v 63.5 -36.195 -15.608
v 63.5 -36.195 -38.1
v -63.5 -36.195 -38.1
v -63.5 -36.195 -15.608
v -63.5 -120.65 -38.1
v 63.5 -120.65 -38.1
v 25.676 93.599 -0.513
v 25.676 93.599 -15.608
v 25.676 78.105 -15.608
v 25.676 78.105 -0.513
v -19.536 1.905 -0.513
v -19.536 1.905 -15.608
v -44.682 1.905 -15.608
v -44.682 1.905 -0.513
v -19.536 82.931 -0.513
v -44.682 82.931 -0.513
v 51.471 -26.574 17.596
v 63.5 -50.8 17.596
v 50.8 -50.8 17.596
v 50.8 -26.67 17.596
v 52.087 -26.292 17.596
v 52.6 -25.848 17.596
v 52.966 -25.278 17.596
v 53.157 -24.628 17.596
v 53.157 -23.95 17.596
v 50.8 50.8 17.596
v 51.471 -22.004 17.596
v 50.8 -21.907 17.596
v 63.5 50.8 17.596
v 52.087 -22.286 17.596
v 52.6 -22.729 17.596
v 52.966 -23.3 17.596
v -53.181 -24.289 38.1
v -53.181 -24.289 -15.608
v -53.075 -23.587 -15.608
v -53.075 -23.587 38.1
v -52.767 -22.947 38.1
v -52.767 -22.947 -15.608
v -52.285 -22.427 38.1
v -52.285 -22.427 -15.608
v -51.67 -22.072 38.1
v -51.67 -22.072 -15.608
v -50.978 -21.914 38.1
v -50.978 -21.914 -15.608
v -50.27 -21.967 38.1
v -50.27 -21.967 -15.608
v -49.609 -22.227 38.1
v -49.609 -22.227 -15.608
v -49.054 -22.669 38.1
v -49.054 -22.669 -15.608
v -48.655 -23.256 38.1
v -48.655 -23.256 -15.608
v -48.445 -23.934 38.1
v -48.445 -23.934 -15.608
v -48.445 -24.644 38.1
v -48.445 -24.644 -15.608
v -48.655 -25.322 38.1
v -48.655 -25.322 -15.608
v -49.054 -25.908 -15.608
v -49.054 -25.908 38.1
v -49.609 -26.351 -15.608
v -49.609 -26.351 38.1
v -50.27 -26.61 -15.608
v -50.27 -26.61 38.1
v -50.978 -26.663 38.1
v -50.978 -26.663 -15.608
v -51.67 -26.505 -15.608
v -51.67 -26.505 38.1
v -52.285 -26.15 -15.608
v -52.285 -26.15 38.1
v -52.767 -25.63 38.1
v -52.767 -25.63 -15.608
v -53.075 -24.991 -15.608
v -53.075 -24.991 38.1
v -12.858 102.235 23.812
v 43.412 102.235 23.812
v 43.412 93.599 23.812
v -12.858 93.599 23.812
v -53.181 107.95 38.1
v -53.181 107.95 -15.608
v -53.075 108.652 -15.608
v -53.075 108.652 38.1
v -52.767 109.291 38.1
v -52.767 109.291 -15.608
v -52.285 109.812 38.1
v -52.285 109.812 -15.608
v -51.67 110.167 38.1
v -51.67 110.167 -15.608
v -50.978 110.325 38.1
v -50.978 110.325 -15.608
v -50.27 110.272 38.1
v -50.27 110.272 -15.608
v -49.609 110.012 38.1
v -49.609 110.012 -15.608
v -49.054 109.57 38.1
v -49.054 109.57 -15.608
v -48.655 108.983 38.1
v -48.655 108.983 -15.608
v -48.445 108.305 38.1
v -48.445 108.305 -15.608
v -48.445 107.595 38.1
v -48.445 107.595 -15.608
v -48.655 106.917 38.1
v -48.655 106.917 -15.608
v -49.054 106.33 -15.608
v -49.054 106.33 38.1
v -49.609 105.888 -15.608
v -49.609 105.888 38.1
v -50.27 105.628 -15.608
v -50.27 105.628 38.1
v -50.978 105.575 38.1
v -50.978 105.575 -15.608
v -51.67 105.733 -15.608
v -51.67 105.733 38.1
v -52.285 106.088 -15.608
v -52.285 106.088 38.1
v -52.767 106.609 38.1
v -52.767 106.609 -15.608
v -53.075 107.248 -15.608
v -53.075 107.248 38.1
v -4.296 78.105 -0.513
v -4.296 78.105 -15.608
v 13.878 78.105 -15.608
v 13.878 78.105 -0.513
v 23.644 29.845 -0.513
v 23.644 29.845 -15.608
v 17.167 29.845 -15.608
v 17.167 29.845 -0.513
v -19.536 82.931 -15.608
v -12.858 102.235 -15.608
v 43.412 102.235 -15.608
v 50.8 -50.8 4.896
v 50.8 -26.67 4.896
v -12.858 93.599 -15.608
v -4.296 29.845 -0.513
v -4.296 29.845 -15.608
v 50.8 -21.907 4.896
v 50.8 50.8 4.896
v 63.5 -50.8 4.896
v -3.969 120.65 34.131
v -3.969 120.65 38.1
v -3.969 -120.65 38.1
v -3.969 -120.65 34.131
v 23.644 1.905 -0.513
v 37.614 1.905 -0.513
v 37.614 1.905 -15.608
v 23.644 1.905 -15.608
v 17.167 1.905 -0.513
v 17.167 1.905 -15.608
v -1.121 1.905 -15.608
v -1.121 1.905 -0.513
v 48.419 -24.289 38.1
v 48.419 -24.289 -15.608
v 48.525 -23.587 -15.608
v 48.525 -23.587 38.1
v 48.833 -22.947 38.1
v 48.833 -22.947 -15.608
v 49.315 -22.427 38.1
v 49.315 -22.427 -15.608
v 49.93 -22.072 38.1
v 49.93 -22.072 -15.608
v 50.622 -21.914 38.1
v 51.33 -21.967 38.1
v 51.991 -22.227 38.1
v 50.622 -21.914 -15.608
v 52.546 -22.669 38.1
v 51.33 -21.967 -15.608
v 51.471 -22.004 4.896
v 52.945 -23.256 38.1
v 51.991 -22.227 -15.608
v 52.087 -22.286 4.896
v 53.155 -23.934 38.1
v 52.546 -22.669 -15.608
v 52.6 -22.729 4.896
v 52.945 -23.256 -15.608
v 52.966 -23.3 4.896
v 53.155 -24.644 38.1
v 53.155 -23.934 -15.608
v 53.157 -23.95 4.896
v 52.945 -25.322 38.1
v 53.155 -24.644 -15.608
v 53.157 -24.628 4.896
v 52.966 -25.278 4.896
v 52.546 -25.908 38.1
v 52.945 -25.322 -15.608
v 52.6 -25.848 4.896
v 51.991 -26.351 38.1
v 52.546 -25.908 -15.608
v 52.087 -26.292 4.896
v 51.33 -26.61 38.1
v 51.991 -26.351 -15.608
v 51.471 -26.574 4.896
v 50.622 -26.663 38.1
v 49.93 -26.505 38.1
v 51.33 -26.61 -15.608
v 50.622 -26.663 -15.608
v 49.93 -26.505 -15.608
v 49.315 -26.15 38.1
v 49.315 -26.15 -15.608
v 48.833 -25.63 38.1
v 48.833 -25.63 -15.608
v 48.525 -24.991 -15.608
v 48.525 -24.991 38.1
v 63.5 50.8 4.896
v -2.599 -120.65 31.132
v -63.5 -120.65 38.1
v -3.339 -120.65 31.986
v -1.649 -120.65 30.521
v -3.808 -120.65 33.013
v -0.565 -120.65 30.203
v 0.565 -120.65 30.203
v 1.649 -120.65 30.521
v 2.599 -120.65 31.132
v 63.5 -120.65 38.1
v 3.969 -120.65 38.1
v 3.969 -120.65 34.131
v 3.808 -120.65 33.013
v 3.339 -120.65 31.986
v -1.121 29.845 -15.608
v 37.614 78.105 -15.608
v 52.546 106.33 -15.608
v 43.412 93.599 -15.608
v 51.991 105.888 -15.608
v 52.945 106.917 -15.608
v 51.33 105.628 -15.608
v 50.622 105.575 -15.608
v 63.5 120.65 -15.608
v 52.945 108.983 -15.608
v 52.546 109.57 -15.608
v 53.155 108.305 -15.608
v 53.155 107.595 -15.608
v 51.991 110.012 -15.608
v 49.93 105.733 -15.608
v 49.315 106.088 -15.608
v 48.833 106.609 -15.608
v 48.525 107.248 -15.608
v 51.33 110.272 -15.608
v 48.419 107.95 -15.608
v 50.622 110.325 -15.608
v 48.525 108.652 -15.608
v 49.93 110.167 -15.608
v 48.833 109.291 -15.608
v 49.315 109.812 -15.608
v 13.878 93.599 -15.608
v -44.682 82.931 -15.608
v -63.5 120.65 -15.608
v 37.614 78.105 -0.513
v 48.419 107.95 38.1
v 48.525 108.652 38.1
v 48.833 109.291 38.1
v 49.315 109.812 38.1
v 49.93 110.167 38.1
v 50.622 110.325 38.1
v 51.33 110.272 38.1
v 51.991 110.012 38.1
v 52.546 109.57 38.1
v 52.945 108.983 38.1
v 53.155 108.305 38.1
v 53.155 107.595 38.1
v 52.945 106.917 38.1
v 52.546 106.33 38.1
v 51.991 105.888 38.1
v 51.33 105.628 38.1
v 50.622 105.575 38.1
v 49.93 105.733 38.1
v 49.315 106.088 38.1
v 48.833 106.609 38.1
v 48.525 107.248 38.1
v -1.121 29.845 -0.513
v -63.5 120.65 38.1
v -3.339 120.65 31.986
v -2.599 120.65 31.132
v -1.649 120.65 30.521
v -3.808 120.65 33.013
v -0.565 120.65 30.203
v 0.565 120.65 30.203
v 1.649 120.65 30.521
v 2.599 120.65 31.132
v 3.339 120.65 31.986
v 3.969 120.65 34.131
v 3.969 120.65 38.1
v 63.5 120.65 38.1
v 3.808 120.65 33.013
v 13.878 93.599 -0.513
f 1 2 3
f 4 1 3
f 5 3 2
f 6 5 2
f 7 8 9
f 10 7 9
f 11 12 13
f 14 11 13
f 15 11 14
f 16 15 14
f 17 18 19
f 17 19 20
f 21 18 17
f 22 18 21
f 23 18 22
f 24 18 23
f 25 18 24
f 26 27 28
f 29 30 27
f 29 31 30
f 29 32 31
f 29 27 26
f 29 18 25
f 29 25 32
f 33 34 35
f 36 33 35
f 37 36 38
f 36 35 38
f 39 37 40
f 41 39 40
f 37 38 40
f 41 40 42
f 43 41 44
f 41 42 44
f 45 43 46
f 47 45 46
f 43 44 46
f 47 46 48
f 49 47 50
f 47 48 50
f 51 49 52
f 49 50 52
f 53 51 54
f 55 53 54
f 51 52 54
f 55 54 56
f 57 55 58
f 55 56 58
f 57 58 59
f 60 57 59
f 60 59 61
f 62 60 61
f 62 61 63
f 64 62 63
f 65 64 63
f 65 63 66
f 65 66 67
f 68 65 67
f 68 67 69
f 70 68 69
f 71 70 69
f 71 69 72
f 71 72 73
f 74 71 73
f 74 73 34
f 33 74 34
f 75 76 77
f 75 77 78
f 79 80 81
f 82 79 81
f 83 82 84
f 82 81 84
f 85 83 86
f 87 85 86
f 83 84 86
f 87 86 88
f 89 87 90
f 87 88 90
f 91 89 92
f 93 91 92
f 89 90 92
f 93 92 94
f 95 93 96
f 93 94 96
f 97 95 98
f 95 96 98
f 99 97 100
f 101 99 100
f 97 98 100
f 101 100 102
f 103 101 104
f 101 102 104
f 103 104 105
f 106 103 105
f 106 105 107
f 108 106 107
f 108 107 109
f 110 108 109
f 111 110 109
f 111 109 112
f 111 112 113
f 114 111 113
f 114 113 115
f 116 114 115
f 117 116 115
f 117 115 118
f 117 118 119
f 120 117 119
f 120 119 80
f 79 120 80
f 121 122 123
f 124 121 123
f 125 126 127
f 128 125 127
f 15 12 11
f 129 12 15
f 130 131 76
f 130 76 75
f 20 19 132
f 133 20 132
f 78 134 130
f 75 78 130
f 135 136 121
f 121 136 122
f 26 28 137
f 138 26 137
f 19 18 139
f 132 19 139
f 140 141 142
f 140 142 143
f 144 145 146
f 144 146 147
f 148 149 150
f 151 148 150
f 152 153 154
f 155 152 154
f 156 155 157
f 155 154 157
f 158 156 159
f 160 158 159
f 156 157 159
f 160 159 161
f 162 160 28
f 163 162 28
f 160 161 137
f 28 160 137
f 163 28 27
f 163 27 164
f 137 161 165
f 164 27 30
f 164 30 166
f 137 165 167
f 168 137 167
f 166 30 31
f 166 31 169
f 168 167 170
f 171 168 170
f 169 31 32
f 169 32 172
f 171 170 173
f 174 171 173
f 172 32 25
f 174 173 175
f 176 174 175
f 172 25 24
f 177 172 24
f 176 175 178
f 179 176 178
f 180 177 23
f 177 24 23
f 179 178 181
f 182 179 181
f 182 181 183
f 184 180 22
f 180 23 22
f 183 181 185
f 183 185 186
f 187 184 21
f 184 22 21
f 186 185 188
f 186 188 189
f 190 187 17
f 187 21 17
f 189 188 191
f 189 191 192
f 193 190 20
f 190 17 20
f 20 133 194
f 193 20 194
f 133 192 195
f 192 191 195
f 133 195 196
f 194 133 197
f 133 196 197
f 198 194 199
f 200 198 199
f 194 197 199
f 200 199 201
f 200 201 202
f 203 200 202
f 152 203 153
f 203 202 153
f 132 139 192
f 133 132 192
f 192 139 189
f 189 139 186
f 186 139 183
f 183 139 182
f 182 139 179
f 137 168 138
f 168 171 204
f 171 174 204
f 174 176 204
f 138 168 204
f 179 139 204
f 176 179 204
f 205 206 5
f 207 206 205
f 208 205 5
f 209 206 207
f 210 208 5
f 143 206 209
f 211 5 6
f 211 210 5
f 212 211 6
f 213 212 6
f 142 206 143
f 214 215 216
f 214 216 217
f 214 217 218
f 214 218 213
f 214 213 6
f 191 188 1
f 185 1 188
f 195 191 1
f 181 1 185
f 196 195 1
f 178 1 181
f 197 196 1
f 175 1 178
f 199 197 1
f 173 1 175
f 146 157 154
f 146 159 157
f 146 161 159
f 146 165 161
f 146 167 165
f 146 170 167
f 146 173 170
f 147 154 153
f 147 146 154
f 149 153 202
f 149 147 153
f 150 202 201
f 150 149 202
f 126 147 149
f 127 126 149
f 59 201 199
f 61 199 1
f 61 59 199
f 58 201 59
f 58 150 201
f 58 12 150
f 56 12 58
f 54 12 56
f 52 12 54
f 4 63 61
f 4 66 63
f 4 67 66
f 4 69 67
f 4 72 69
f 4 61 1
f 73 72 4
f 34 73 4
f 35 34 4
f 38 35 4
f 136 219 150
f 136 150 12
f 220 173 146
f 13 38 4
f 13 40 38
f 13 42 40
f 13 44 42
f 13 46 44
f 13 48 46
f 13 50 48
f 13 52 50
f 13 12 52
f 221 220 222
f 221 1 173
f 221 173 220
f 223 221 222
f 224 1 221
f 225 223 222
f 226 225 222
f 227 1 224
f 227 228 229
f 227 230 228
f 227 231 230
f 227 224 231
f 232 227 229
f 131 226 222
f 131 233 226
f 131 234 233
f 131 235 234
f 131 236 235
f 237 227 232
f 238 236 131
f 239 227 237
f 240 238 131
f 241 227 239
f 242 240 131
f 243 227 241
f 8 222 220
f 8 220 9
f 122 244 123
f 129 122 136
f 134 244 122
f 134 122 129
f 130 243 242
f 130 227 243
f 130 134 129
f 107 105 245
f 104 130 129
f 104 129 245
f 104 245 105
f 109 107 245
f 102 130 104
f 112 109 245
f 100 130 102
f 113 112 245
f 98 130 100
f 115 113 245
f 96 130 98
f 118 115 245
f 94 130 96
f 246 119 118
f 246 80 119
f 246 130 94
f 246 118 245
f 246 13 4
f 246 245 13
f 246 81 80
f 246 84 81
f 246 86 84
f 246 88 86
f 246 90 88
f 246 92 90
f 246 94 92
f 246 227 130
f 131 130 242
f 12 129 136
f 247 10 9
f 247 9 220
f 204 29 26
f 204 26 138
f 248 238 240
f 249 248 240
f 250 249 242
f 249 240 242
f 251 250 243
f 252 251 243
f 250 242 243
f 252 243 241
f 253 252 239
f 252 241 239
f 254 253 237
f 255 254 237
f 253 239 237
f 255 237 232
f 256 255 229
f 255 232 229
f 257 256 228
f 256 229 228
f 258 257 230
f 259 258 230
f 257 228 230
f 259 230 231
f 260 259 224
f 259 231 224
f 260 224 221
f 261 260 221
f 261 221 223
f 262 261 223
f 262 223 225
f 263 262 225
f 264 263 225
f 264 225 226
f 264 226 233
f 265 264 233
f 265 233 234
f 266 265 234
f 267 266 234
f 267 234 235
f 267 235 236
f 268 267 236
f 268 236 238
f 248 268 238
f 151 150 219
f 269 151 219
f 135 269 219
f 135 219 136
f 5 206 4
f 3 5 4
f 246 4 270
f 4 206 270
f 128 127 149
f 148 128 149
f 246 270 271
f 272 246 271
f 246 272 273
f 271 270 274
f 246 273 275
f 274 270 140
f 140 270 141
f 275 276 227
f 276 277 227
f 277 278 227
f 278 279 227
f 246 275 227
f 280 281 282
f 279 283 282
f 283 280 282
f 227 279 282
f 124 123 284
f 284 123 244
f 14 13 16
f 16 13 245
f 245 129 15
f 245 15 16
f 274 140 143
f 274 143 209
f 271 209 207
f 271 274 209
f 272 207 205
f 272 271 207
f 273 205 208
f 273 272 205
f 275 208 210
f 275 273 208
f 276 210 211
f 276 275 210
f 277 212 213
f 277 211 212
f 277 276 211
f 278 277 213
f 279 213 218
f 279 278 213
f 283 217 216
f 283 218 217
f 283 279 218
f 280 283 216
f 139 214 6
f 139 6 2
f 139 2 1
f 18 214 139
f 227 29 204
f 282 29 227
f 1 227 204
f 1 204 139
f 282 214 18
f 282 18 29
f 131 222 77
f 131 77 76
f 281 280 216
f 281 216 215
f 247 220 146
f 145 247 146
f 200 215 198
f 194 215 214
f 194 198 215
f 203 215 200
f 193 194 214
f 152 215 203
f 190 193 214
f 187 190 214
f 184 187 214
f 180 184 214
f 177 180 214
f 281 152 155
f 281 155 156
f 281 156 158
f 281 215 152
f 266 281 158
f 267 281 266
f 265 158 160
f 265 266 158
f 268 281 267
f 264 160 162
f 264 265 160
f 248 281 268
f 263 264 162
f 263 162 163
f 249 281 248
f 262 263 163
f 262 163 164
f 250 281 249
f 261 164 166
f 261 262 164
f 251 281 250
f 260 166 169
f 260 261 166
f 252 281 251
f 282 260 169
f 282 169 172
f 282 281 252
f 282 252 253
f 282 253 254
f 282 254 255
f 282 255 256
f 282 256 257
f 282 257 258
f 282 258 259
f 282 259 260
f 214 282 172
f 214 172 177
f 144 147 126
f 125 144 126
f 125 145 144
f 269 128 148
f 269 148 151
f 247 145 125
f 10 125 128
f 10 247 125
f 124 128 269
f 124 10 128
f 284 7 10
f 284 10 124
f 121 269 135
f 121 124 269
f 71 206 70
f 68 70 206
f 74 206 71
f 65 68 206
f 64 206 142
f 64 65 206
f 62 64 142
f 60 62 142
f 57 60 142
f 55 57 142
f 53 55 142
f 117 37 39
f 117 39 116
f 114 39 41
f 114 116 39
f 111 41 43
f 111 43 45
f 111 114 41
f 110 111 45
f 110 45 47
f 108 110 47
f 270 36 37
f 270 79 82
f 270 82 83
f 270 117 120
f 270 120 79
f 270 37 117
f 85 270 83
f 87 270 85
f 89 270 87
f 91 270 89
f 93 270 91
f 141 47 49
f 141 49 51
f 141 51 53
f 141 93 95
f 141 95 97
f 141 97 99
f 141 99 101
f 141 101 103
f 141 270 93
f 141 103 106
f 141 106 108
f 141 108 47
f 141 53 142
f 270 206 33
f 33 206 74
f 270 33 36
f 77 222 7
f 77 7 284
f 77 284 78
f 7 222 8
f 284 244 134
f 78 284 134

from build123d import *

# Parameters (mm, degrees)
SKETCH1_W           = 127
SKETCH1_H           = 241.3
BOSS_EXTRUDE1_DEPTH = 38.1
CUT_EXTRUDE1_REACH  = 254.408
SKETCH3_W           = 25.146
SKETCH3_H           = 81.026
CUT_EXTRUDE2_DEPTH  = 37.5875
SKETCH4_W           = 56.27
SKETCH4_H           = 8.636
CUT_EXTRUDE3_DEPTH  = 61.9125
SKETCH5_W           = 127
SKETCH5_H           = 156.845
CUT_EXTRUDE4_DEPTH  = 22.4917
CUT_EXTRUDE5_REACH  = 148.538
SKETCH6_R           = 2.38125
SKETCH7_W           = 12.7
SKETCH7_H           = 101.6
CUT_EXTRUDE6_DEPTH  = 12.7


with BuildPart() as part:
    # Sketch1 → Boss-Extrude1 (new, symmetric)
    with BuildSketch(Plane.XY):
        Rectangle(SKETCH1_W, SKETCH1_H)
    extrude(amount=BOSS_EXTRUDE1_DEPTH, both=True)

    # Sketch2 → Cut-Extrude1 (cut, up to next)
    with BuildSketch(Plane(origin=(0, 120.65, 0), x_dir=(1, 0, 0), z_dir=(0, 1, 0)), mode=Mode.PRIVATE) as cut_extrude1_sk1:
        with BuildLine():
            Line((-3.96875, -38.1), (-3.96875, -34.13125))
            ThreePointArc((-3.96875, -34.13125), (0, -30.1625), (3.96875, -34.13125))
            Line((3.96875, -34.13125), (3.96875, -38.1))
            Line((3.96875, -38.1), (-3.96875, -38.1))
        make_face()
    cut_extrude1_tool1 = extrude(cut_extrude1_sk1.sketch, amount=-CUT_EXTRUDE1_REACH, mode=Mode.PRIVATE) & part.part
    add(cut_extrude1_tool1.solids().sort_by_distance((0, 120.65, 34.501732))[0], mode=Mode.SUBTRACT)

    # Sketch3 → Cut-Extrude2 (cut)
    with BuildSketch(Plane(origin=(0, 0, -38.1), x_dir=(-1, 0, 0), z_dir=(0, 0, -1))):
        Polygon((-37.614075, 78.105), (-37.614075, 57.8612), (-37.614075, 39.878), (-37.614075, 31.75), (-37.614075, 1.905), (-23.644075, 1.905), (-23.644075, 29.845), (-17.167075, 29.845), (-17.167075, 1.905), (1.120925, 1.905), (1.120925, 29.845), (4.295925, 29.845), (4.295925, 78.105), (-13.877775, 78.105), (-13.877775, 96.139), (-25.676075, 96.139), (-25.676075, 78.105), align=None)
        with Locations((32.108925, 42.418)):
            Rectangle(SKETCH3_W, SKETCH3_H)
    extrude(amount=-CUT_EXTRUDE2_DEPTH, mode=Mode.SUBTRACT)

    # Sketch4 → Cut-Extrude3 (cut)
    with BuildSketch(Plane(origin=(0, 0, -38.1), x_dir=(-1, 0, 0), z_dir=(0, 0, -1))):
        with Locations((-15.276925, 97.917)):
            Rectangle(SKETCH4_W, SKETCH4_H)
    extrude(amount=-CUT_EXTRUDE3_DEPTH, mode=Mode.SUBTRACT)

    # Sketch5 → Cut-Extrude4 (cut)
    with BuildSketch(Plane(origin=(0, 0, -38.1), x_dir=(-1, 0, 0), z_dir=(0, 0, -1))):
        with Locations((0, 42.2275)):
            Rectangle(SKETCH5_W, SKETCH5_H)
    extrude(amount=-CUT_EXTRUDE4_DEPTH, mode=Mode.SUBTRACT)

    # Sketch6 → Cut-Extrude5 (cut, up to next)
    with BuildSketch(Plane(origin=(0, 0, -15.6083), x_dir=(-1, 0, 0), z_dir=(0, 0, -1)), mode=Mode.PRIVATE) as cut_extrude5_sk1:
        with Locations((-50.8, -24.28875)):
            Circle(SKETCH6_R)
    cut_extrude5_tool1 = extrude(cut_extrude5_sk1.sketch, amount=-CUT_EXTRUDE5_REACH, mode=Mode.PRIVATE) & part.part
    # Sketch6 → Cut-Extrude5 (cut, up to next)
    with BuildSketch(Plane(origin=(0, 0, -15.6083), x_dir=(-1, 0, 0), z_dir=(0, 0, -1)), mode=Mode.PRIVATE) as cut_extrude5_sk2:
        with Locations((50.8, 107.95)):
            Circle(SKETCH6_R)
    cut_extrude5_tool2 = extrude(cut_extrude5_sk2.sketch, amount=-CUT_EXTRUDE5_REACH, mode=Mode.PRIVATE) & part.part
    # Sketch6 → Cut-Extrude5 (cut, up to next)
    with BuildSketch(Plane(origin=(0, 0, -15.6083), x_dir=(-1, 0, 0), z_dir=(0, 0, -1)), mode=Mode.PRIVATE) as cut_extrude5_sk3:
        with Locations((50.8, -24.28875)):
            Circle(SKETCH6_R)
    cut_extrude5_tool3 = extrude(cut_extrude5_sk3.sketch, amount=-CUT_EXTRUDE5_REACH, mode=Mode.PRIVATE) & part.part
    # Sketch6 → Cut-Extrude5 (cut, up to next)
    with BuildSketch(Plane(origin=(0, 0, -15.6083), x_dir=(-1, 0, 0), z_dir=(0, 0, -1)), mode=Mode.PRIVATE) as cut_extrude5_sk4:
        with Locations((-50.8, 107.95)):
            Circle(SKETCH6_R)
    cut_extrude5_tool4 = extrude(cut_extrude5_sk4.sketch, amount=-CUT_EXTRUDE5_REACH, mode=Mode.PRIVATE) & part.part
    add(cut_extrude5_tool1.solids().sort_by_distance((50.8, -24.28875, -15.6083))[0], mode=Mode.SUBTRACT)
    add(cut_extrude5_tool2.solids().sort_by_distance((-50.8, 107.95, -15.6083))[0], mode=Mode.SUBTRACT)
    add(cut_extrude5_tool3.solids().sort_by_distance((-50.8, -24.28875, -15.6083))[0], mode=Mode.SUBTRACT)
    add(cut_extrude5_tool4.solids().sort_by_distance((50.8, 107.95, -15.6083))[0], mode=Mode.SUBTRACT)

    # Sketch7 → Cut-Extrude6 (cut)
    with BuildSketch(Plane(origin=(63.5, 0, 0), x_dir=(0, 0, -1), z_dir=(1, 0, 0))):
        with Locations((-11.24585, 0)):
            Rectangle(SKETCH7_W, SKETCH7_H)
    extrude(amount=-CUT_EXTRUDE6_DEPTH, mode=Mode.SUBTRACT)


solid = part.part
